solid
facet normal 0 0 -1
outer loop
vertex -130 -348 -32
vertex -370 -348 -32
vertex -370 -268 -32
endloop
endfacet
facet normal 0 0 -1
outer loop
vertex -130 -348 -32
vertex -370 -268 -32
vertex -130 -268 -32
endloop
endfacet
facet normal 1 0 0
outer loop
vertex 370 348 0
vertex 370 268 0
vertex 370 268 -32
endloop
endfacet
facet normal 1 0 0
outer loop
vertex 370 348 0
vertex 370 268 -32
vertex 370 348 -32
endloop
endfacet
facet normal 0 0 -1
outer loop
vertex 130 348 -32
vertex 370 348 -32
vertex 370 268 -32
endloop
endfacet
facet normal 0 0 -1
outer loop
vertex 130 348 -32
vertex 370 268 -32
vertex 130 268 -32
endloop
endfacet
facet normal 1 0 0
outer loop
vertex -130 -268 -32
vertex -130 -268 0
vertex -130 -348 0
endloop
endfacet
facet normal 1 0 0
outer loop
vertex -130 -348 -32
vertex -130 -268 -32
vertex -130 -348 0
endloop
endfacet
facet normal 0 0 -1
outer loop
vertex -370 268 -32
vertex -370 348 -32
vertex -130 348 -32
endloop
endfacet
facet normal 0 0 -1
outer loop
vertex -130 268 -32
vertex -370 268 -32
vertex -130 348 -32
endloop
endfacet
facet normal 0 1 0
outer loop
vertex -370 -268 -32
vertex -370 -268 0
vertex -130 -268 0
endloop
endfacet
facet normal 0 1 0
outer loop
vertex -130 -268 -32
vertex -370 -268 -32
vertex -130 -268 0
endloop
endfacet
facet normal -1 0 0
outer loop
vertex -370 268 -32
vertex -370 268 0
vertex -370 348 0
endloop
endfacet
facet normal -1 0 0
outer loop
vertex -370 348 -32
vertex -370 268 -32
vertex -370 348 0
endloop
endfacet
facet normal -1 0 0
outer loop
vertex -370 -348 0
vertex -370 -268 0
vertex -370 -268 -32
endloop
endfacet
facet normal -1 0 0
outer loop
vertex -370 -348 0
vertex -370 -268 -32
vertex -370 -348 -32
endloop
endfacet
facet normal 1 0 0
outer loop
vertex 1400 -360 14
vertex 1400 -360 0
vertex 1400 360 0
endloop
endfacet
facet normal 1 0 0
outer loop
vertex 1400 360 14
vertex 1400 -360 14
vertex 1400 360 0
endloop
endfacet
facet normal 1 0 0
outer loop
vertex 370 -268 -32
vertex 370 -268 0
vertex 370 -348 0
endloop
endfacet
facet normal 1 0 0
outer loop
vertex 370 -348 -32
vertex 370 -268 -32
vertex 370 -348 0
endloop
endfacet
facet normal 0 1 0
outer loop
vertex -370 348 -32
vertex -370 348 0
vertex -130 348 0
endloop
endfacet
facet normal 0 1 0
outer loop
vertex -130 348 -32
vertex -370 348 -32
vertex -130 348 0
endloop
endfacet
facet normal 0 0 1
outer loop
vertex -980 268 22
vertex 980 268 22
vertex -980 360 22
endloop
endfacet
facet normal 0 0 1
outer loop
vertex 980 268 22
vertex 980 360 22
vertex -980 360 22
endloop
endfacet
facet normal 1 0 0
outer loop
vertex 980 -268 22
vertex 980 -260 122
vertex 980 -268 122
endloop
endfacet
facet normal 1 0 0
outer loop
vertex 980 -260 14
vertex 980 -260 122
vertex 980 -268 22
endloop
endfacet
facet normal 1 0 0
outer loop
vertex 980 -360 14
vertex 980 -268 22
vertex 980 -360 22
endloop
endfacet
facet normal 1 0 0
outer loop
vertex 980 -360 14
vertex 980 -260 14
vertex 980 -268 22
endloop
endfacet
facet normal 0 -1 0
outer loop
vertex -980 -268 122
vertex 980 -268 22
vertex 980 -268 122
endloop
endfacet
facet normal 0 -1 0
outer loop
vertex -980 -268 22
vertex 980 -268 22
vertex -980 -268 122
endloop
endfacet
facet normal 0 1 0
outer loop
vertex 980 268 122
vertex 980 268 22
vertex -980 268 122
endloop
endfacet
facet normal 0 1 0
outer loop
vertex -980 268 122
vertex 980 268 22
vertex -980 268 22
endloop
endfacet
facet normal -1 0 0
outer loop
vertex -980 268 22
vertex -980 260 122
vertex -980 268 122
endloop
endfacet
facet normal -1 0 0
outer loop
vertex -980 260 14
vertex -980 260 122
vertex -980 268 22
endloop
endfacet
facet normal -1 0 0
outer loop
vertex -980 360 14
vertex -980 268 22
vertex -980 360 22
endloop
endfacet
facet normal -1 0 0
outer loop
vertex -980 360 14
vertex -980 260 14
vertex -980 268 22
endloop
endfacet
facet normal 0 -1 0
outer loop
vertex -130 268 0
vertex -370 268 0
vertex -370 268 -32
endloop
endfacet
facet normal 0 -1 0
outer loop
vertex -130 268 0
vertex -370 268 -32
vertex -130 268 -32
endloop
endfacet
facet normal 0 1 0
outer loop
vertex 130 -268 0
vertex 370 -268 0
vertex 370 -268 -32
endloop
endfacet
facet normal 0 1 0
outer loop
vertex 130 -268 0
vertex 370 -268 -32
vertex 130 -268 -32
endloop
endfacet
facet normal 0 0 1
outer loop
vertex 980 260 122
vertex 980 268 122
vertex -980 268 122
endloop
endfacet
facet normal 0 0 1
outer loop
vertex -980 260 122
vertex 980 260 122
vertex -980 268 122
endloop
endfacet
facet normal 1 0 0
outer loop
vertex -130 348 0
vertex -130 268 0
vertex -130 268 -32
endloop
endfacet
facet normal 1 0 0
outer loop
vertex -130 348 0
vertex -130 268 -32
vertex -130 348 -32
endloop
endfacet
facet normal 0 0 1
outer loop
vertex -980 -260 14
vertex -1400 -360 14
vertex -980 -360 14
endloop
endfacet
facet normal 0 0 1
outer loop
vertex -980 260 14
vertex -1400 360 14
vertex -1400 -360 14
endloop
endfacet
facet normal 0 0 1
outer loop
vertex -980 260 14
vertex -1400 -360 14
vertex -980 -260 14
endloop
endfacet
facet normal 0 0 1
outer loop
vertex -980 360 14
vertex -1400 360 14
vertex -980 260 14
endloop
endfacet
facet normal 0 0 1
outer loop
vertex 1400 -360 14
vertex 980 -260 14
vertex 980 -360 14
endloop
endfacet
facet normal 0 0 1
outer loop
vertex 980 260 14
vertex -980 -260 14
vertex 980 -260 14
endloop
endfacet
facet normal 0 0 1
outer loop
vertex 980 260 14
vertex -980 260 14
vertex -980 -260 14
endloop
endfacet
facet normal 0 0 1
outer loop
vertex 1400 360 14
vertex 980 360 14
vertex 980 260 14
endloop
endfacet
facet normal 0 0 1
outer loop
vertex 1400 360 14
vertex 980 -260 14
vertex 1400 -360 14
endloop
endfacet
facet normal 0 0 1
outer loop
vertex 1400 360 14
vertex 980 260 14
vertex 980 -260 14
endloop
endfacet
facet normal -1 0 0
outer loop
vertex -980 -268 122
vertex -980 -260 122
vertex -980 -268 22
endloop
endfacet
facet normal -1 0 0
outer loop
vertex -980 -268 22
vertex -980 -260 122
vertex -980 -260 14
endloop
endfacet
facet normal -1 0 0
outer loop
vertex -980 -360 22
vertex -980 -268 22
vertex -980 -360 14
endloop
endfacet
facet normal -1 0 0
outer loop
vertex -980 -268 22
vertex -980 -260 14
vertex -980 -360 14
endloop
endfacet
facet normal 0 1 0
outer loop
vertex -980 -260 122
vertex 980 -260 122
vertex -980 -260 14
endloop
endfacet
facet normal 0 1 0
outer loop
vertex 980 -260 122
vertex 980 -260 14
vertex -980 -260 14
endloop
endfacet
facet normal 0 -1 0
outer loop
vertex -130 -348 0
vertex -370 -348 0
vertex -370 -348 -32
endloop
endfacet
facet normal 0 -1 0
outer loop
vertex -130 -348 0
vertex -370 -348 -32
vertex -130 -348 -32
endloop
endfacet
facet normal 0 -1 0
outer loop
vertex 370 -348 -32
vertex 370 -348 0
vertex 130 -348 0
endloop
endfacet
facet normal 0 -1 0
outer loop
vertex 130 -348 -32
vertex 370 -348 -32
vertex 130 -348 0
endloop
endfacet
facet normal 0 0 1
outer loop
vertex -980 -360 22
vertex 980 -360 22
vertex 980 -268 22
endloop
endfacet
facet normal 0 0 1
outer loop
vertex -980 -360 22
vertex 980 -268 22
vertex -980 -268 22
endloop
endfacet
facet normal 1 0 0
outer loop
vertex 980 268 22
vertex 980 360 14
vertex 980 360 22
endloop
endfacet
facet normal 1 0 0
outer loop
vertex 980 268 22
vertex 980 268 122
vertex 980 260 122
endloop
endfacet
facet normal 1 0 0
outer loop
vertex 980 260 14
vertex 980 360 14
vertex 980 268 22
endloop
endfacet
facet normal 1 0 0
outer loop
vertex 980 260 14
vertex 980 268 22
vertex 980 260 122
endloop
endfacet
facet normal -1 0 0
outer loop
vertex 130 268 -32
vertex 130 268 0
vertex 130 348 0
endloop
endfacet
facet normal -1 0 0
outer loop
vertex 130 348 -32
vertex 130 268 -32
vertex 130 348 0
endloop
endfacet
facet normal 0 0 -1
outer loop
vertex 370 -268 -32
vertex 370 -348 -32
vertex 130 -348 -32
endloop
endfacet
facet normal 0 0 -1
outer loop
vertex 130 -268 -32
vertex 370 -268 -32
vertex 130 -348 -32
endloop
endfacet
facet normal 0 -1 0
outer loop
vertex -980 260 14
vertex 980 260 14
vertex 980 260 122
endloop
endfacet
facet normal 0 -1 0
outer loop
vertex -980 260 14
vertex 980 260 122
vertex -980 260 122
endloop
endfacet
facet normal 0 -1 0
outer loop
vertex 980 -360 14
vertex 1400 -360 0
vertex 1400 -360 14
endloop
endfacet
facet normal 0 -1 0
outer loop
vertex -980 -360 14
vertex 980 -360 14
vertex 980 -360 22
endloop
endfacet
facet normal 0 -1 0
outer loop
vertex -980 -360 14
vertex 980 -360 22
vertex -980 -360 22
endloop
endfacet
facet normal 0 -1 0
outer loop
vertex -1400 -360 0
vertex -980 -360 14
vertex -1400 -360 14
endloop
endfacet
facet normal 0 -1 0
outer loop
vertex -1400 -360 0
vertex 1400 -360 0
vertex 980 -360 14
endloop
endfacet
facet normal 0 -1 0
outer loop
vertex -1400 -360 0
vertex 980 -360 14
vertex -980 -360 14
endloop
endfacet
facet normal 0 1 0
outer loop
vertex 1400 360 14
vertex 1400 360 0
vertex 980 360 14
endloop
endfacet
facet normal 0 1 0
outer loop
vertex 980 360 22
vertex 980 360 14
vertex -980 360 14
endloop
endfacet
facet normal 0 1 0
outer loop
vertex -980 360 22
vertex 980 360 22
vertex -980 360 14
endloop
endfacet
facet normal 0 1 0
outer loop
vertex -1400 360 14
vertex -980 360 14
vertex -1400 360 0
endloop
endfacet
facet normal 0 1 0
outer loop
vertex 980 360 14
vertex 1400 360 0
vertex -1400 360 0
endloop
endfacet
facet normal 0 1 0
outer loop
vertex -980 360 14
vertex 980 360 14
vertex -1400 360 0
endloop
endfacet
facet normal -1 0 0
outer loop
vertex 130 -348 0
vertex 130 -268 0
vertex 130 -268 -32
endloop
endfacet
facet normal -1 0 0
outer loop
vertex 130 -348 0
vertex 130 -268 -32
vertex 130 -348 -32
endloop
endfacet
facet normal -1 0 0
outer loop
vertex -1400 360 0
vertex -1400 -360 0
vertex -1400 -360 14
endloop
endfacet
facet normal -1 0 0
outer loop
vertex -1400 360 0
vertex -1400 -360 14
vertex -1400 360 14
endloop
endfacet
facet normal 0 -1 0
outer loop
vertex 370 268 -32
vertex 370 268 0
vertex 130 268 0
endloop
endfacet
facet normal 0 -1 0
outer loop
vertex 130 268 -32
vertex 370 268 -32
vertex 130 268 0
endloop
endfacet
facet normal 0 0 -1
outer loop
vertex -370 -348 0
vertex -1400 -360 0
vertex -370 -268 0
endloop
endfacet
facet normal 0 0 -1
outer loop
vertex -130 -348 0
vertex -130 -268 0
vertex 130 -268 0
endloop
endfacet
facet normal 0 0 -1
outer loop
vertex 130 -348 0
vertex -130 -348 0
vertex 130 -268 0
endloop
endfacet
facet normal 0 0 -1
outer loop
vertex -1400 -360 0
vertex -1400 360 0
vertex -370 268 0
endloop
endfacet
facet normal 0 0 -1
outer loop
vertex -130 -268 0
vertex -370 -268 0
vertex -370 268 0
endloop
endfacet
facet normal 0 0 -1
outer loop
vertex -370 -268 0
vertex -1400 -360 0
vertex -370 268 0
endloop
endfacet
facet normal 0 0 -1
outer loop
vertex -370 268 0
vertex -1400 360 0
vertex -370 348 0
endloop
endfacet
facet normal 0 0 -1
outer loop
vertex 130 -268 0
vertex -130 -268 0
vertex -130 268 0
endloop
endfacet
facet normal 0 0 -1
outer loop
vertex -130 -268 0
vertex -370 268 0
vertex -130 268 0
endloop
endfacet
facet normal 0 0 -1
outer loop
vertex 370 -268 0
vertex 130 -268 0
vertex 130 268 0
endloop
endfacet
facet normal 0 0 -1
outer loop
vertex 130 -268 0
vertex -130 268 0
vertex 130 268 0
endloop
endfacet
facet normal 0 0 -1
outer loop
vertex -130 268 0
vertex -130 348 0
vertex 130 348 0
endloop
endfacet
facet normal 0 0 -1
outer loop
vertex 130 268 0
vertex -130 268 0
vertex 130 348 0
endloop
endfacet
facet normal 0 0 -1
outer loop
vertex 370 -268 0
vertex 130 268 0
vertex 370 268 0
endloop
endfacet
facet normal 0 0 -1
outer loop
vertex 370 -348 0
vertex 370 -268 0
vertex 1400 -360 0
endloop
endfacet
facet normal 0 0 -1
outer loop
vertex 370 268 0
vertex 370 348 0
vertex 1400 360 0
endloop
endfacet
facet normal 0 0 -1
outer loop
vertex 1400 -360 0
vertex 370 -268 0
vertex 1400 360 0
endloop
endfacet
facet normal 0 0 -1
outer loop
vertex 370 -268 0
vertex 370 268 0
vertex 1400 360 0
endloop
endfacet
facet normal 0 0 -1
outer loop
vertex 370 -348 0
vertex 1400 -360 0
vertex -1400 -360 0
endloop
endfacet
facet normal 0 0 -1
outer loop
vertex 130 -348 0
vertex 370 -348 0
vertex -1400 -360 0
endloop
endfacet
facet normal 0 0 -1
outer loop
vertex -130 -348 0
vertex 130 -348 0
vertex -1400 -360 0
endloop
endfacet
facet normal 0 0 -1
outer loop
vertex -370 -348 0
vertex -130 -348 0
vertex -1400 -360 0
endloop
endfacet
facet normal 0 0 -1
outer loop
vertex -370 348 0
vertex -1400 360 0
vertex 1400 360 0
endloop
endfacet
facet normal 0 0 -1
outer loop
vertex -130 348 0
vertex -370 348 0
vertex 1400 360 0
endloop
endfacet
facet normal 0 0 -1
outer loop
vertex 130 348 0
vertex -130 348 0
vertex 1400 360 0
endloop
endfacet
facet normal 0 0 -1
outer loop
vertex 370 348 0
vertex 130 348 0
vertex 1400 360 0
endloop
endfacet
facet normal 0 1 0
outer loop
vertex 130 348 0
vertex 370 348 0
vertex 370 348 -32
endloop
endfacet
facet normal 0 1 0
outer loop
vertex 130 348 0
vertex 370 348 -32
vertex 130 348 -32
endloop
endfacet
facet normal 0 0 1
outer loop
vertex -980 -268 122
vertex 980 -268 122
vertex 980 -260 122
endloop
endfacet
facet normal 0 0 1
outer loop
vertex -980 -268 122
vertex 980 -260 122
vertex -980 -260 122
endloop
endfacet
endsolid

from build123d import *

# Parameters (mm, degrees)
SKETCH_1_W               = 2800
SKETCH_1_H               = 720
EXTRUDE_1_DEPTH          = 14
SKETCH_5_W               = 980
SKETCH_5_H               = 100
EXTRUDE_2_DEPTH          = 8
SKETCH_9_W               = 980
SKETCH_9_H               = 8
EXTRUDE_3_DEPTH          = 100
MIRROR_4_COPY_1_SKETCH_W = 980
MIRROR_4_COPY_1_SKETCH_H = 100
MIRROR_4_COPY_1_DEPTH    = 8
MIRROR_4_COPY_2_SKETCH_W = 980
MIRROR_4_COPY_2_SKETCH_H = 8
MIRROR_4_COPY_2_DEPTH    = 100
MIRROR_4_COPY_3_SKETCH_W = 980
MIRROR_4_COPY_3_SKETCH_H = 100
MIRROR_4_COPY_3_DEPTH    = 8
MIRROR_4_COPY_4_SKETCH_W = 980
MIRROR_4_COPY_4_SKETCH_H = 8
MIRROR_4_COPY_4_DEPTH    = 100
SKETCH_11_W              = 240
SKETCH_11_H              = 80
EXTRUDE_4_DEPTH          = 32
SKETCH_12_R              = 13
CUT_EXTRUDE_5_DEPTH      = 1449.999654934
PATTERN_LINEAR_4_COUNT   = 3
PATTERN_LINEAR_4_PITCH   = 80
SKETCH_11_3_W            = 240
SKETCH_11_3_H            = 80
EXTRUDE_6_DEPTH          = 54
MIRROR_8_COPY_1_SKETCH_W = 240
MIRROR_8_COPY_1_SKETCH_H = 80
MIRROR_8_COPY_1_DEPTH    = 54
MIRROR_8_COPY_2_SKETCH_W = 240
MIRROR_8_COPY_2_SKETCH_H = 80
MIRROR_8_COPY_2_DEPTH    = 54


with BuildPart() as part:
    # 草图1 → 凸台-拉伸1 (new body)
    with BuildSketch(Plane.XY):
        Rectangle(SKETCH_1_W, SKETCH_1_H)
    extrude(amount=EXTRUDE_1_DEPTH)

    # 草图5 → 凸台-拉伸2 (add)
    with BuildSketch(Plane.XY.offset(14)):
        with Locations((-490, 310)):
            Rectangle(SKETCH_5_W, SKETCH_5_H)
    extrude_2 = extrude(amount=EXTRUDE_2_DEPTH)

    # 草图9 → 凸台-拉伸3 (add)
    with BuildSketch(Plane.XY.offset(22)):
        with Locations((-490, 264)):
            Rectangle(SKETCH_9_W, SKETCH_9_H)
    extrude_3 = extrude(amount=EXTRUDE_3_DEPTH)

    # 镜向3: 凸台-拉伸2, 凸台-拉伸3 across plane
    add(extrude_2.mirror(Plane.ZX))
    add(extrude_3.mirror(Plane.ZX))

    # 镜向4 copy 1 sketch → 镜向4 copy 1 (add)
    with BuildSketch(Plane(origin=(0, 0, 14), x_dir=(-1, 0, 0), z_dir=(0, 0, 1))):
        with Locations((-490, 310)):
            Rectangle(MIRROR_4_COPY_1_SKETCH_W, MIRROR_4_COPY_1_SKETCH_H)
    extrude(amount=MIRROR_4_COPY_1_DEPTH)

    # 镜向4 copy 2 sketch → 镜向4 copy 2 (add)
    with BuildSketch(Plane(origin=(0, 0, 22), x_dir=(-1, 0, 0), z_dir=(0, 0, 1))):
        with Locations((-490, 264)):
            Rectangle(MIRROR_4_COPY_2_SKETCH_W, MIRROR_4_COPY_2_SKETCH_H)
    extrude(amount=MIRROR_4_COPY_2_DEPTH)

    # 镜向4 copy 3 sketch → 镜向4 copy 3 (add)
    with BuildSketch(Plane(origin=(0, 0, 14), x_dir=(-1, 0, 0), z_dir=(0, 0, 1))):
        with Locations((-490, -310)):
            Rectangle(MIRROR_4_COPY_3_SKETCH_W, MIRROR_4_COPY_3_SKETCH_H)
    extrude(amount=MIRROR_4_COPY_3_DEPTH)

    # 镜向4 copy 4 sketch → 镜向4 copy 4 (add)
    with BuildSketch(Plane(origin=(0, 0, 22), x_dir=(-1, 0, 0), z_dir=(0, 0, 1))):
        with Locations((-490, -264)):
            Rectangle(MIRROR_4_COPY_4_SKETCH_W, MIRROR_4_COPY_4_SKETCH_H)
    extrude(amount=MIRROR_4_COPY_4_DEPTH)

    # 草图11 → 凸台-拉伸4 (add)
    with BuildSketch(Plane.XY.offset(22)):
        with Locations((-250, 308)):
            Rectangle(SKETCH_11_W, SKETCH_11_H)
    extrude(amount=-EXTRUDE_4_DEPTH)

    # 草图12 → 切除-拉伸5 (cut, through all)
    with BuildSketch(Plane.XY.offset(22)):
        with Locations((-330, 304)):
            Circle(SKETCH_12_R)
    cut_extrude_5 = extrude(amount=-CUT_EXTRUDE_5_DEPTH, mode=Mode.SUBTRACT)

    # 阵列(线性)4: 切除-拉伸5 ×3
    with Locations(*[(i * PATTERN_LINEAR_4_PITCH, 0, 0) for i in range(1, PATTERN_LINEAR_4_COUNT)]):
        add(cut_extrude_5, mode=Mode.SUBTRACT)

    # 草图11<3> → 凸台-拉伸6 (add)
    with BuildSketch(Plane.XY.offset(22)):
        with Locations((-250, 308)):
            Rectangle(SKETCH_11_3_W, SKETCH_11_3_H)
    extrude_6 = extrude(amount=-EXTRUDE_6_DEPTH)

    # 镜向7: 凸台-拉伸6 across plane
    add(extrude_6.mirror(Plane.ZX))

    # 镜向8 copy 1 sketch → 镜向8 copy 1 (add)
    with BuildSketch(Plane(origin=(0, 0, 22), x_dir=(-1, 0, 0), z_dir=(0, 0, 1))):
        with Locations((-250, 308)):
            Rectangle(MIRROR_8_COPY_1_SKETCH_W, MIRROR_8_COPY_1_SKETCH_H)
    extrude(amount=-MIRROR_8_COPY_1_DEPTH)

    # 镜向8 copy 2 sketch → 镜向8 copy 2 (add)
    with BuildSketch(Plane(origin=(0, 0, 22), x_dir=(-1, 0, 0), z_dir=(0, 0, 1))):
        with Locations((-250, -308)):
            Rectangle(MIRROR_8_COPY_2_SKETCH_W, MIRROR_8_COPY_2_SKETCH_H)
    extrude(amount=-MIRROR_8_COPY_2_DEPTH)


solid = part.part
